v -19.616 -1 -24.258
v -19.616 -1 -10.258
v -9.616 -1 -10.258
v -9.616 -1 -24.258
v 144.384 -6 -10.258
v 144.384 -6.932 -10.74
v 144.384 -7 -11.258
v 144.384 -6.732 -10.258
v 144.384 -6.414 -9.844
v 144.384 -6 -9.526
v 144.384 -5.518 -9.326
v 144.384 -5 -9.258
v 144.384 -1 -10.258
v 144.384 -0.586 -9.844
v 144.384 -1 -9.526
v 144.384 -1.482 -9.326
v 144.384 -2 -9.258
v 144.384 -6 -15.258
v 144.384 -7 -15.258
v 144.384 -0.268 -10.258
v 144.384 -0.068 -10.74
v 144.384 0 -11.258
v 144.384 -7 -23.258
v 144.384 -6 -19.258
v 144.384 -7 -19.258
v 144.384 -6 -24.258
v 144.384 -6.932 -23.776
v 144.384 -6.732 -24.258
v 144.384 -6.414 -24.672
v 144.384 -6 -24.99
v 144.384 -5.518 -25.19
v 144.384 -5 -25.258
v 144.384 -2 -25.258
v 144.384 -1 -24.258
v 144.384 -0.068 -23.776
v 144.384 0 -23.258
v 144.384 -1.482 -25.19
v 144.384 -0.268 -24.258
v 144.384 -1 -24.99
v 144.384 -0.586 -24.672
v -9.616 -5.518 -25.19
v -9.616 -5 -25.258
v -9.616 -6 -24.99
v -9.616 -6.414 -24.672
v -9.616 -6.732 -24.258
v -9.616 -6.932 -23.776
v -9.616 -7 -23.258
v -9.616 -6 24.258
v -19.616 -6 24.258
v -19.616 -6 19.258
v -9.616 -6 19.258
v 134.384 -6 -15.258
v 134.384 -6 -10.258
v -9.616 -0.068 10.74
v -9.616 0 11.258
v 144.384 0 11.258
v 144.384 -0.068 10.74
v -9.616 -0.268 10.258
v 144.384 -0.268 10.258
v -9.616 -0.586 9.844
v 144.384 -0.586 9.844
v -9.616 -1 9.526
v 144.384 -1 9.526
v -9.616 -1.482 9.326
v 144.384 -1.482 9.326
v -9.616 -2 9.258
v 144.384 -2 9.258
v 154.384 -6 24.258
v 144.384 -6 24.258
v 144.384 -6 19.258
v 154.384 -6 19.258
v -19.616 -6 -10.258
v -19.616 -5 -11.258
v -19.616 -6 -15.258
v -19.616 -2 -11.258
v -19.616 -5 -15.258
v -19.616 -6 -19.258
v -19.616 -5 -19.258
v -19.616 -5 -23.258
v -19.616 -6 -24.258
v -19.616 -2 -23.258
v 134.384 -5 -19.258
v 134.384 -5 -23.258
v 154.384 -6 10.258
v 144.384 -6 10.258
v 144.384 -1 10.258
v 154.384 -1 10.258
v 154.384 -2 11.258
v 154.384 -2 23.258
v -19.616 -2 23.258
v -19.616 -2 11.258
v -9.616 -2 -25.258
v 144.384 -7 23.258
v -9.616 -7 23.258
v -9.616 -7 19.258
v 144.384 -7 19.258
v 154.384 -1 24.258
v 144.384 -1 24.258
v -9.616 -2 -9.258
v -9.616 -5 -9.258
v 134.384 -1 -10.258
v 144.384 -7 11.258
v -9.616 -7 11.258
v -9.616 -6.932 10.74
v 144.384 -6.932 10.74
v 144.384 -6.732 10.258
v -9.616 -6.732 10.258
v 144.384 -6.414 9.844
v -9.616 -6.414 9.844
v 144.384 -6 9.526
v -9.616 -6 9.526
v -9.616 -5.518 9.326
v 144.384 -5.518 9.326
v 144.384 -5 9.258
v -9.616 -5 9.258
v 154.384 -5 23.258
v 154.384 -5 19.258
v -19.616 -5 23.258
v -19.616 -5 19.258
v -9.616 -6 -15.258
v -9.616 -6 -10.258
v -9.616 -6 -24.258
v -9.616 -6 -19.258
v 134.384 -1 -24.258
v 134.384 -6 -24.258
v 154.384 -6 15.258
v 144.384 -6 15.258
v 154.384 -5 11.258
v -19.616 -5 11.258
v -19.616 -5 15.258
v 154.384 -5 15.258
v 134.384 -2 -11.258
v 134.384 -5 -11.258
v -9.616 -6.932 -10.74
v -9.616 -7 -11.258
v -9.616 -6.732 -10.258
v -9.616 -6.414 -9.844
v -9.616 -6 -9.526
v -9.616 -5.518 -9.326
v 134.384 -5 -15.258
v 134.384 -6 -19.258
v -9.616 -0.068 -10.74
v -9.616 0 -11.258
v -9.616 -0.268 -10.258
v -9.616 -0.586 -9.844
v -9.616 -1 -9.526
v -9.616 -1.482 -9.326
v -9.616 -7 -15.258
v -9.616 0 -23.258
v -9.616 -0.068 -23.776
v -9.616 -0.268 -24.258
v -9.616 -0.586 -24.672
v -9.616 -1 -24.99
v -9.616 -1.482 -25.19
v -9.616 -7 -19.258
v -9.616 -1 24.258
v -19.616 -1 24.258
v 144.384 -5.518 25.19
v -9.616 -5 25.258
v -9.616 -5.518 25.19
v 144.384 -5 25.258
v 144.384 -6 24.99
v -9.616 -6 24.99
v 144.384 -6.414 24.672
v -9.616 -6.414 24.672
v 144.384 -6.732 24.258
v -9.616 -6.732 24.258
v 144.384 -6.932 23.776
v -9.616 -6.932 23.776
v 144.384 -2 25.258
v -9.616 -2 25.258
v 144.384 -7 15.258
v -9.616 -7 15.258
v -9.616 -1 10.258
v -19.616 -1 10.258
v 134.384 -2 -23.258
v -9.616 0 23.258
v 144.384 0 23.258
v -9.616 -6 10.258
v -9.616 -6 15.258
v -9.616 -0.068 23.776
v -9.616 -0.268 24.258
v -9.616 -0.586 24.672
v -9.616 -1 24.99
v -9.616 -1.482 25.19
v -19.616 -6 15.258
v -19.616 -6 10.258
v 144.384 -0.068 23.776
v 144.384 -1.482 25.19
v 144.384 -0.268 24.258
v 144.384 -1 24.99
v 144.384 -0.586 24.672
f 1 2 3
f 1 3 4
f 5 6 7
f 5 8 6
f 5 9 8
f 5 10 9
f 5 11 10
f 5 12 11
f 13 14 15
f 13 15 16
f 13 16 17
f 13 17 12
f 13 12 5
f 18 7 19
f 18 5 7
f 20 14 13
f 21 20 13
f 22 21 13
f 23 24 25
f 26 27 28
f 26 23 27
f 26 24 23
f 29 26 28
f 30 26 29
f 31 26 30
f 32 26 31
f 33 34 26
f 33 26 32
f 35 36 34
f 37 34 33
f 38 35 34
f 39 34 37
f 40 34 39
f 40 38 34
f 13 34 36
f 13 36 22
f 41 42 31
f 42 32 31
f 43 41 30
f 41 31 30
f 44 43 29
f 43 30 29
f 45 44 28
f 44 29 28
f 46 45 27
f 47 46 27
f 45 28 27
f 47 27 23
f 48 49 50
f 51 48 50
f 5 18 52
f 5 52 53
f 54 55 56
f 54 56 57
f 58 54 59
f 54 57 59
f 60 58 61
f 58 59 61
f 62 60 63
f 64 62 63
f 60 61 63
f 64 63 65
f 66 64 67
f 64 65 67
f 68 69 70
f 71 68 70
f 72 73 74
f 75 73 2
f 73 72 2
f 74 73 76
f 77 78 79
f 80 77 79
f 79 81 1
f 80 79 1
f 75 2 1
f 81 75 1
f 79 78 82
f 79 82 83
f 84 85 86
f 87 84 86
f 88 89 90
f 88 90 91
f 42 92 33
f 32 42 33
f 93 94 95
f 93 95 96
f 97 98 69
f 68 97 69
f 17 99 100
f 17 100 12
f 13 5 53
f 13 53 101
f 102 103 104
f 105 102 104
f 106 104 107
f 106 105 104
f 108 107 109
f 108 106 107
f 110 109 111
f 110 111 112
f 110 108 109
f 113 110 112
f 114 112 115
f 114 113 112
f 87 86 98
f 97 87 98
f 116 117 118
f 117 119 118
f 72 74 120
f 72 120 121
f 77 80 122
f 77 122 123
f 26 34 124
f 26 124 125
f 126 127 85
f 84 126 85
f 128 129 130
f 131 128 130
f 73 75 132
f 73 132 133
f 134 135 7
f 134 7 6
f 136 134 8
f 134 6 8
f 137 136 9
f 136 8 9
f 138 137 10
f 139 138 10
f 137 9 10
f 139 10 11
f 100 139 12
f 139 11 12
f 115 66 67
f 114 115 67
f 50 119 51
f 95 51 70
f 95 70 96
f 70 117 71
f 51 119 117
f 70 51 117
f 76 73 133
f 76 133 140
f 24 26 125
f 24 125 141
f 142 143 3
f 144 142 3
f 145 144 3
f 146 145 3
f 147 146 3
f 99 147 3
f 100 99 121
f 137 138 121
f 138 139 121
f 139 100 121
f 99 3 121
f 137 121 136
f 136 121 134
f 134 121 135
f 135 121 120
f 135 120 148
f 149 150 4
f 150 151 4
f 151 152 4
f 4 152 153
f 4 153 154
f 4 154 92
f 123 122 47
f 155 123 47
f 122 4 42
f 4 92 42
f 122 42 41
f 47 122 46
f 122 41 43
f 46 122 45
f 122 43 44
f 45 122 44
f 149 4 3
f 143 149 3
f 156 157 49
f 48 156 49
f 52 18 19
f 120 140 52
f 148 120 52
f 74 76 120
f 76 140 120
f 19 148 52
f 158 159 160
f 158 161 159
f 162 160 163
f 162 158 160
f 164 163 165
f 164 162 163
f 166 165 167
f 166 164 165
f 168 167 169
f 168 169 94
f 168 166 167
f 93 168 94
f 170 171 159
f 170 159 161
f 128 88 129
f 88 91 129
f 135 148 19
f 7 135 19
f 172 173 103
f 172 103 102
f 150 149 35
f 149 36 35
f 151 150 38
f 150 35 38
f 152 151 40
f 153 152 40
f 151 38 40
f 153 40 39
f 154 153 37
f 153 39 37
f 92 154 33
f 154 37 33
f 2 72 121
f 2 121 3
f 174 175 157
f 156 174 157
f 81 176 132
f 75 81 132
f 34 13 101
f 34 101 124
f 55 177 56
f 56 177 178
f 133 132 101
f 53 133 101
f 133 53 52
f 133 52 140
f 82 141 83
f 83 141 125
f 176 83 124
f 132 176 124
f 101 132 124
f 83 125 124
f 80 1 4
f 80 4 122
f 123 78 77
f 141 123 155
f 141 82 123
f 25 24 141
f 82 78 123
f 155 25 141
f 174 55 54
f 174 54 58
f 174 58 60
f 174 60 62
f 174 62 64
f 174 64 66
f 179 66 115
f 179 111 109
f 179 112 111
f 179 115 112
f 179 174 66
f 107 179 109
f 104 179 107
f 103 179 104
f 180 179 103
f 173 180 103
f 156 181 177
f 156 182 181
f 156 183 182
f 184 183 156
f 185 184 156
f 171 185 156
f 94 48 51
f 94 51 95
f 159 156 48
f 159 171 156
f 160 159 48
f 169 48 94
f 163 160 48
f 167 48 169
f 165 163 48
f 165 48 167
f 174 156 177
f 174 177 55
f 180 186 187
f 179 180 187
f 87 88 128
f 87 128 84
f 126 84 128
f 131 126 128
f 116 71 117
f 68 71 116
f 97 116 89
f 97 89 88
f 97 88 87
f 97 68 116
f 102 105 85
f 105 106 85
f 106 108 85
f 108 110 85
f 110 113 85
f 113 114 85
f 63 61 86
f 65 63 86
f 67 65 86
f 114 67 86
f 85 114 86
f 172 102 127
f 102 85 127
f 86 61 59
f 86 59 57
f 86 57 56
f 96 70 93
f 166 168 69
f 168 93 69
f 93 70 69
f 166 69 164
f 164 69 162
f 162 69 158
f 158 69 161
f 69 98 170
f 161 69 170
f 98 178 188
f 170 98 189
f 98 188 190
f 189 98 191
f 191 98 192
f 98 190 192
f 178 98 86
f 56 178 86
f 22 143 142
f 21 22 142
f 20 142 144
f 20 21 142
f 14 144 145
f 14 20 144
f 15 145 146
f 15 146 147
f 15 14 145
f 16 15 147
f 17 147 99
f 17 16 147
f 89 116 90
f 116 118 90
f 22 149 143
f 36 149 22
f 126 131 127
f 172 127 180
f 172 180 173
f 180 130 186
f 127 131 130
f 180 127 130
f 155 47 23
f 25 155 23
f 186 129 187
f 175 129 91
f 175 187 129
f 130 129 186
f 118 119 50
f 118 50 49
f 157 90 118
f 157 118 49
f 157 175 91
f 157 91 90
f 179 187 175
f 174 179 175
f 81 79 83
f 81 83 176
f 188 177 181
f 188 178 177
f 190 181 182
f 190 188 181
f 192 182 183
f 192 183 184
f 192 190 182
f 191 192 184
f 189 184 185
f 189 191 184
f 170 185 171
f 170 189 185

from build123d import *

# Parameters (mm, degrees)
F0_W      = 164
F0_H      = 16
F1_DEPTH  = 7
F3_DEPTH  = 164.001
F5_DEPTH  = 10
F7_DEPTH  = 10
F8_R      = 2
F10_DEPTH = 20


with BuildPart() as f1:
    # F0 (on Front) → F1 (new body)
    with BuildSketch(Plane.XZ):
        with Locations((62.3839493543, 17.2579787597)):
            Rectangle(F0_W, F0_H)
    extrude(amount=F1_DEPTH)

    # F2 (on face) → F3 (cut, through all)
    with BuildSketch(Plane.YZ.offset(144.3839493543)):
        Polygon((-7, 19.2579787597), (-7, 15.2579787597), (-5, 15.2579787597), (-5, 11.2579787597), (-2, 11.2579787597), (-2, 23.2579787597), (-5, 23.2579787597), (-5, 19.2579787597), align=None)
    extrude(amount=-F3_DEPTH, mode=Mode.SUBTRACT)

    # F4 (on face) → F5 (join)
    with BuildSketch(Plane.YZ.offset(144.3839493543)):
        Polygon((-6, 15.2579787597), (-6, 10.2579787597), (-1, 10.2579787597), (-1, 24.2579787597), (-6, 24.2579787597), (-6, 19.2579787597), (-5, 19.2579787597), (-5, 23.2579787597), (-2, 23.2579787597), (-2, 11.2579787597), (-5, 11.2579787597), (-5, 15.2579787597), align=None)
    extrude(amount=F5_DEPTH)

    # F6 (on face) → F7 (cut)
    with BuildSketch(Plane(origin=(-19.6160506457, 0, 0), x_dir=(0, -1, 0), z_dir=(-1, 0, 0))):
        Polygon((1, 24.2579787597), (6, 24.2579787597), (6, 19.2579787597), (7, 19.2579787597), (7, 25.2579787597), (0, 25.2579787597), (0, 9.2579787597), (7, 9.2579787597), (7, 15.2579787597), (6, 15.2579787597), (6, 10.2579787597), (1, 10.2579787597), align=None)
    extrude(amount=-F7_DEPTH, mode=Mode.SUBTRACT)

    # F8
    f8_edges = [f1.edges().sort_by_distance(p)[0] for p in [
        (67.383949, -7, 25.257979),
        (67.383949, -7, 9.257979),
        (67.383949, 0, 25.257979),
        (67.383949, 0, 9.257979),
    ]]
    fillet(f8_edges, radius=F8_R)


with BuildPart() as f9_1:
    # F9: instance of F1
    add(f1.part.mirror(Plane.XY))

    # F10 (cut): a face of the model
    f10_faces = [f9_1.faces().sort_by_distance(p)[0] for p in [
        (154.3839493543, -5.8513393125, -12.7579787597),
    ]]
    extrude(f10_faces, amount=-F10_DEPTH, mode=Mode.SUBTRACT)


solid = Compound([f1.part, f9_1.part])
